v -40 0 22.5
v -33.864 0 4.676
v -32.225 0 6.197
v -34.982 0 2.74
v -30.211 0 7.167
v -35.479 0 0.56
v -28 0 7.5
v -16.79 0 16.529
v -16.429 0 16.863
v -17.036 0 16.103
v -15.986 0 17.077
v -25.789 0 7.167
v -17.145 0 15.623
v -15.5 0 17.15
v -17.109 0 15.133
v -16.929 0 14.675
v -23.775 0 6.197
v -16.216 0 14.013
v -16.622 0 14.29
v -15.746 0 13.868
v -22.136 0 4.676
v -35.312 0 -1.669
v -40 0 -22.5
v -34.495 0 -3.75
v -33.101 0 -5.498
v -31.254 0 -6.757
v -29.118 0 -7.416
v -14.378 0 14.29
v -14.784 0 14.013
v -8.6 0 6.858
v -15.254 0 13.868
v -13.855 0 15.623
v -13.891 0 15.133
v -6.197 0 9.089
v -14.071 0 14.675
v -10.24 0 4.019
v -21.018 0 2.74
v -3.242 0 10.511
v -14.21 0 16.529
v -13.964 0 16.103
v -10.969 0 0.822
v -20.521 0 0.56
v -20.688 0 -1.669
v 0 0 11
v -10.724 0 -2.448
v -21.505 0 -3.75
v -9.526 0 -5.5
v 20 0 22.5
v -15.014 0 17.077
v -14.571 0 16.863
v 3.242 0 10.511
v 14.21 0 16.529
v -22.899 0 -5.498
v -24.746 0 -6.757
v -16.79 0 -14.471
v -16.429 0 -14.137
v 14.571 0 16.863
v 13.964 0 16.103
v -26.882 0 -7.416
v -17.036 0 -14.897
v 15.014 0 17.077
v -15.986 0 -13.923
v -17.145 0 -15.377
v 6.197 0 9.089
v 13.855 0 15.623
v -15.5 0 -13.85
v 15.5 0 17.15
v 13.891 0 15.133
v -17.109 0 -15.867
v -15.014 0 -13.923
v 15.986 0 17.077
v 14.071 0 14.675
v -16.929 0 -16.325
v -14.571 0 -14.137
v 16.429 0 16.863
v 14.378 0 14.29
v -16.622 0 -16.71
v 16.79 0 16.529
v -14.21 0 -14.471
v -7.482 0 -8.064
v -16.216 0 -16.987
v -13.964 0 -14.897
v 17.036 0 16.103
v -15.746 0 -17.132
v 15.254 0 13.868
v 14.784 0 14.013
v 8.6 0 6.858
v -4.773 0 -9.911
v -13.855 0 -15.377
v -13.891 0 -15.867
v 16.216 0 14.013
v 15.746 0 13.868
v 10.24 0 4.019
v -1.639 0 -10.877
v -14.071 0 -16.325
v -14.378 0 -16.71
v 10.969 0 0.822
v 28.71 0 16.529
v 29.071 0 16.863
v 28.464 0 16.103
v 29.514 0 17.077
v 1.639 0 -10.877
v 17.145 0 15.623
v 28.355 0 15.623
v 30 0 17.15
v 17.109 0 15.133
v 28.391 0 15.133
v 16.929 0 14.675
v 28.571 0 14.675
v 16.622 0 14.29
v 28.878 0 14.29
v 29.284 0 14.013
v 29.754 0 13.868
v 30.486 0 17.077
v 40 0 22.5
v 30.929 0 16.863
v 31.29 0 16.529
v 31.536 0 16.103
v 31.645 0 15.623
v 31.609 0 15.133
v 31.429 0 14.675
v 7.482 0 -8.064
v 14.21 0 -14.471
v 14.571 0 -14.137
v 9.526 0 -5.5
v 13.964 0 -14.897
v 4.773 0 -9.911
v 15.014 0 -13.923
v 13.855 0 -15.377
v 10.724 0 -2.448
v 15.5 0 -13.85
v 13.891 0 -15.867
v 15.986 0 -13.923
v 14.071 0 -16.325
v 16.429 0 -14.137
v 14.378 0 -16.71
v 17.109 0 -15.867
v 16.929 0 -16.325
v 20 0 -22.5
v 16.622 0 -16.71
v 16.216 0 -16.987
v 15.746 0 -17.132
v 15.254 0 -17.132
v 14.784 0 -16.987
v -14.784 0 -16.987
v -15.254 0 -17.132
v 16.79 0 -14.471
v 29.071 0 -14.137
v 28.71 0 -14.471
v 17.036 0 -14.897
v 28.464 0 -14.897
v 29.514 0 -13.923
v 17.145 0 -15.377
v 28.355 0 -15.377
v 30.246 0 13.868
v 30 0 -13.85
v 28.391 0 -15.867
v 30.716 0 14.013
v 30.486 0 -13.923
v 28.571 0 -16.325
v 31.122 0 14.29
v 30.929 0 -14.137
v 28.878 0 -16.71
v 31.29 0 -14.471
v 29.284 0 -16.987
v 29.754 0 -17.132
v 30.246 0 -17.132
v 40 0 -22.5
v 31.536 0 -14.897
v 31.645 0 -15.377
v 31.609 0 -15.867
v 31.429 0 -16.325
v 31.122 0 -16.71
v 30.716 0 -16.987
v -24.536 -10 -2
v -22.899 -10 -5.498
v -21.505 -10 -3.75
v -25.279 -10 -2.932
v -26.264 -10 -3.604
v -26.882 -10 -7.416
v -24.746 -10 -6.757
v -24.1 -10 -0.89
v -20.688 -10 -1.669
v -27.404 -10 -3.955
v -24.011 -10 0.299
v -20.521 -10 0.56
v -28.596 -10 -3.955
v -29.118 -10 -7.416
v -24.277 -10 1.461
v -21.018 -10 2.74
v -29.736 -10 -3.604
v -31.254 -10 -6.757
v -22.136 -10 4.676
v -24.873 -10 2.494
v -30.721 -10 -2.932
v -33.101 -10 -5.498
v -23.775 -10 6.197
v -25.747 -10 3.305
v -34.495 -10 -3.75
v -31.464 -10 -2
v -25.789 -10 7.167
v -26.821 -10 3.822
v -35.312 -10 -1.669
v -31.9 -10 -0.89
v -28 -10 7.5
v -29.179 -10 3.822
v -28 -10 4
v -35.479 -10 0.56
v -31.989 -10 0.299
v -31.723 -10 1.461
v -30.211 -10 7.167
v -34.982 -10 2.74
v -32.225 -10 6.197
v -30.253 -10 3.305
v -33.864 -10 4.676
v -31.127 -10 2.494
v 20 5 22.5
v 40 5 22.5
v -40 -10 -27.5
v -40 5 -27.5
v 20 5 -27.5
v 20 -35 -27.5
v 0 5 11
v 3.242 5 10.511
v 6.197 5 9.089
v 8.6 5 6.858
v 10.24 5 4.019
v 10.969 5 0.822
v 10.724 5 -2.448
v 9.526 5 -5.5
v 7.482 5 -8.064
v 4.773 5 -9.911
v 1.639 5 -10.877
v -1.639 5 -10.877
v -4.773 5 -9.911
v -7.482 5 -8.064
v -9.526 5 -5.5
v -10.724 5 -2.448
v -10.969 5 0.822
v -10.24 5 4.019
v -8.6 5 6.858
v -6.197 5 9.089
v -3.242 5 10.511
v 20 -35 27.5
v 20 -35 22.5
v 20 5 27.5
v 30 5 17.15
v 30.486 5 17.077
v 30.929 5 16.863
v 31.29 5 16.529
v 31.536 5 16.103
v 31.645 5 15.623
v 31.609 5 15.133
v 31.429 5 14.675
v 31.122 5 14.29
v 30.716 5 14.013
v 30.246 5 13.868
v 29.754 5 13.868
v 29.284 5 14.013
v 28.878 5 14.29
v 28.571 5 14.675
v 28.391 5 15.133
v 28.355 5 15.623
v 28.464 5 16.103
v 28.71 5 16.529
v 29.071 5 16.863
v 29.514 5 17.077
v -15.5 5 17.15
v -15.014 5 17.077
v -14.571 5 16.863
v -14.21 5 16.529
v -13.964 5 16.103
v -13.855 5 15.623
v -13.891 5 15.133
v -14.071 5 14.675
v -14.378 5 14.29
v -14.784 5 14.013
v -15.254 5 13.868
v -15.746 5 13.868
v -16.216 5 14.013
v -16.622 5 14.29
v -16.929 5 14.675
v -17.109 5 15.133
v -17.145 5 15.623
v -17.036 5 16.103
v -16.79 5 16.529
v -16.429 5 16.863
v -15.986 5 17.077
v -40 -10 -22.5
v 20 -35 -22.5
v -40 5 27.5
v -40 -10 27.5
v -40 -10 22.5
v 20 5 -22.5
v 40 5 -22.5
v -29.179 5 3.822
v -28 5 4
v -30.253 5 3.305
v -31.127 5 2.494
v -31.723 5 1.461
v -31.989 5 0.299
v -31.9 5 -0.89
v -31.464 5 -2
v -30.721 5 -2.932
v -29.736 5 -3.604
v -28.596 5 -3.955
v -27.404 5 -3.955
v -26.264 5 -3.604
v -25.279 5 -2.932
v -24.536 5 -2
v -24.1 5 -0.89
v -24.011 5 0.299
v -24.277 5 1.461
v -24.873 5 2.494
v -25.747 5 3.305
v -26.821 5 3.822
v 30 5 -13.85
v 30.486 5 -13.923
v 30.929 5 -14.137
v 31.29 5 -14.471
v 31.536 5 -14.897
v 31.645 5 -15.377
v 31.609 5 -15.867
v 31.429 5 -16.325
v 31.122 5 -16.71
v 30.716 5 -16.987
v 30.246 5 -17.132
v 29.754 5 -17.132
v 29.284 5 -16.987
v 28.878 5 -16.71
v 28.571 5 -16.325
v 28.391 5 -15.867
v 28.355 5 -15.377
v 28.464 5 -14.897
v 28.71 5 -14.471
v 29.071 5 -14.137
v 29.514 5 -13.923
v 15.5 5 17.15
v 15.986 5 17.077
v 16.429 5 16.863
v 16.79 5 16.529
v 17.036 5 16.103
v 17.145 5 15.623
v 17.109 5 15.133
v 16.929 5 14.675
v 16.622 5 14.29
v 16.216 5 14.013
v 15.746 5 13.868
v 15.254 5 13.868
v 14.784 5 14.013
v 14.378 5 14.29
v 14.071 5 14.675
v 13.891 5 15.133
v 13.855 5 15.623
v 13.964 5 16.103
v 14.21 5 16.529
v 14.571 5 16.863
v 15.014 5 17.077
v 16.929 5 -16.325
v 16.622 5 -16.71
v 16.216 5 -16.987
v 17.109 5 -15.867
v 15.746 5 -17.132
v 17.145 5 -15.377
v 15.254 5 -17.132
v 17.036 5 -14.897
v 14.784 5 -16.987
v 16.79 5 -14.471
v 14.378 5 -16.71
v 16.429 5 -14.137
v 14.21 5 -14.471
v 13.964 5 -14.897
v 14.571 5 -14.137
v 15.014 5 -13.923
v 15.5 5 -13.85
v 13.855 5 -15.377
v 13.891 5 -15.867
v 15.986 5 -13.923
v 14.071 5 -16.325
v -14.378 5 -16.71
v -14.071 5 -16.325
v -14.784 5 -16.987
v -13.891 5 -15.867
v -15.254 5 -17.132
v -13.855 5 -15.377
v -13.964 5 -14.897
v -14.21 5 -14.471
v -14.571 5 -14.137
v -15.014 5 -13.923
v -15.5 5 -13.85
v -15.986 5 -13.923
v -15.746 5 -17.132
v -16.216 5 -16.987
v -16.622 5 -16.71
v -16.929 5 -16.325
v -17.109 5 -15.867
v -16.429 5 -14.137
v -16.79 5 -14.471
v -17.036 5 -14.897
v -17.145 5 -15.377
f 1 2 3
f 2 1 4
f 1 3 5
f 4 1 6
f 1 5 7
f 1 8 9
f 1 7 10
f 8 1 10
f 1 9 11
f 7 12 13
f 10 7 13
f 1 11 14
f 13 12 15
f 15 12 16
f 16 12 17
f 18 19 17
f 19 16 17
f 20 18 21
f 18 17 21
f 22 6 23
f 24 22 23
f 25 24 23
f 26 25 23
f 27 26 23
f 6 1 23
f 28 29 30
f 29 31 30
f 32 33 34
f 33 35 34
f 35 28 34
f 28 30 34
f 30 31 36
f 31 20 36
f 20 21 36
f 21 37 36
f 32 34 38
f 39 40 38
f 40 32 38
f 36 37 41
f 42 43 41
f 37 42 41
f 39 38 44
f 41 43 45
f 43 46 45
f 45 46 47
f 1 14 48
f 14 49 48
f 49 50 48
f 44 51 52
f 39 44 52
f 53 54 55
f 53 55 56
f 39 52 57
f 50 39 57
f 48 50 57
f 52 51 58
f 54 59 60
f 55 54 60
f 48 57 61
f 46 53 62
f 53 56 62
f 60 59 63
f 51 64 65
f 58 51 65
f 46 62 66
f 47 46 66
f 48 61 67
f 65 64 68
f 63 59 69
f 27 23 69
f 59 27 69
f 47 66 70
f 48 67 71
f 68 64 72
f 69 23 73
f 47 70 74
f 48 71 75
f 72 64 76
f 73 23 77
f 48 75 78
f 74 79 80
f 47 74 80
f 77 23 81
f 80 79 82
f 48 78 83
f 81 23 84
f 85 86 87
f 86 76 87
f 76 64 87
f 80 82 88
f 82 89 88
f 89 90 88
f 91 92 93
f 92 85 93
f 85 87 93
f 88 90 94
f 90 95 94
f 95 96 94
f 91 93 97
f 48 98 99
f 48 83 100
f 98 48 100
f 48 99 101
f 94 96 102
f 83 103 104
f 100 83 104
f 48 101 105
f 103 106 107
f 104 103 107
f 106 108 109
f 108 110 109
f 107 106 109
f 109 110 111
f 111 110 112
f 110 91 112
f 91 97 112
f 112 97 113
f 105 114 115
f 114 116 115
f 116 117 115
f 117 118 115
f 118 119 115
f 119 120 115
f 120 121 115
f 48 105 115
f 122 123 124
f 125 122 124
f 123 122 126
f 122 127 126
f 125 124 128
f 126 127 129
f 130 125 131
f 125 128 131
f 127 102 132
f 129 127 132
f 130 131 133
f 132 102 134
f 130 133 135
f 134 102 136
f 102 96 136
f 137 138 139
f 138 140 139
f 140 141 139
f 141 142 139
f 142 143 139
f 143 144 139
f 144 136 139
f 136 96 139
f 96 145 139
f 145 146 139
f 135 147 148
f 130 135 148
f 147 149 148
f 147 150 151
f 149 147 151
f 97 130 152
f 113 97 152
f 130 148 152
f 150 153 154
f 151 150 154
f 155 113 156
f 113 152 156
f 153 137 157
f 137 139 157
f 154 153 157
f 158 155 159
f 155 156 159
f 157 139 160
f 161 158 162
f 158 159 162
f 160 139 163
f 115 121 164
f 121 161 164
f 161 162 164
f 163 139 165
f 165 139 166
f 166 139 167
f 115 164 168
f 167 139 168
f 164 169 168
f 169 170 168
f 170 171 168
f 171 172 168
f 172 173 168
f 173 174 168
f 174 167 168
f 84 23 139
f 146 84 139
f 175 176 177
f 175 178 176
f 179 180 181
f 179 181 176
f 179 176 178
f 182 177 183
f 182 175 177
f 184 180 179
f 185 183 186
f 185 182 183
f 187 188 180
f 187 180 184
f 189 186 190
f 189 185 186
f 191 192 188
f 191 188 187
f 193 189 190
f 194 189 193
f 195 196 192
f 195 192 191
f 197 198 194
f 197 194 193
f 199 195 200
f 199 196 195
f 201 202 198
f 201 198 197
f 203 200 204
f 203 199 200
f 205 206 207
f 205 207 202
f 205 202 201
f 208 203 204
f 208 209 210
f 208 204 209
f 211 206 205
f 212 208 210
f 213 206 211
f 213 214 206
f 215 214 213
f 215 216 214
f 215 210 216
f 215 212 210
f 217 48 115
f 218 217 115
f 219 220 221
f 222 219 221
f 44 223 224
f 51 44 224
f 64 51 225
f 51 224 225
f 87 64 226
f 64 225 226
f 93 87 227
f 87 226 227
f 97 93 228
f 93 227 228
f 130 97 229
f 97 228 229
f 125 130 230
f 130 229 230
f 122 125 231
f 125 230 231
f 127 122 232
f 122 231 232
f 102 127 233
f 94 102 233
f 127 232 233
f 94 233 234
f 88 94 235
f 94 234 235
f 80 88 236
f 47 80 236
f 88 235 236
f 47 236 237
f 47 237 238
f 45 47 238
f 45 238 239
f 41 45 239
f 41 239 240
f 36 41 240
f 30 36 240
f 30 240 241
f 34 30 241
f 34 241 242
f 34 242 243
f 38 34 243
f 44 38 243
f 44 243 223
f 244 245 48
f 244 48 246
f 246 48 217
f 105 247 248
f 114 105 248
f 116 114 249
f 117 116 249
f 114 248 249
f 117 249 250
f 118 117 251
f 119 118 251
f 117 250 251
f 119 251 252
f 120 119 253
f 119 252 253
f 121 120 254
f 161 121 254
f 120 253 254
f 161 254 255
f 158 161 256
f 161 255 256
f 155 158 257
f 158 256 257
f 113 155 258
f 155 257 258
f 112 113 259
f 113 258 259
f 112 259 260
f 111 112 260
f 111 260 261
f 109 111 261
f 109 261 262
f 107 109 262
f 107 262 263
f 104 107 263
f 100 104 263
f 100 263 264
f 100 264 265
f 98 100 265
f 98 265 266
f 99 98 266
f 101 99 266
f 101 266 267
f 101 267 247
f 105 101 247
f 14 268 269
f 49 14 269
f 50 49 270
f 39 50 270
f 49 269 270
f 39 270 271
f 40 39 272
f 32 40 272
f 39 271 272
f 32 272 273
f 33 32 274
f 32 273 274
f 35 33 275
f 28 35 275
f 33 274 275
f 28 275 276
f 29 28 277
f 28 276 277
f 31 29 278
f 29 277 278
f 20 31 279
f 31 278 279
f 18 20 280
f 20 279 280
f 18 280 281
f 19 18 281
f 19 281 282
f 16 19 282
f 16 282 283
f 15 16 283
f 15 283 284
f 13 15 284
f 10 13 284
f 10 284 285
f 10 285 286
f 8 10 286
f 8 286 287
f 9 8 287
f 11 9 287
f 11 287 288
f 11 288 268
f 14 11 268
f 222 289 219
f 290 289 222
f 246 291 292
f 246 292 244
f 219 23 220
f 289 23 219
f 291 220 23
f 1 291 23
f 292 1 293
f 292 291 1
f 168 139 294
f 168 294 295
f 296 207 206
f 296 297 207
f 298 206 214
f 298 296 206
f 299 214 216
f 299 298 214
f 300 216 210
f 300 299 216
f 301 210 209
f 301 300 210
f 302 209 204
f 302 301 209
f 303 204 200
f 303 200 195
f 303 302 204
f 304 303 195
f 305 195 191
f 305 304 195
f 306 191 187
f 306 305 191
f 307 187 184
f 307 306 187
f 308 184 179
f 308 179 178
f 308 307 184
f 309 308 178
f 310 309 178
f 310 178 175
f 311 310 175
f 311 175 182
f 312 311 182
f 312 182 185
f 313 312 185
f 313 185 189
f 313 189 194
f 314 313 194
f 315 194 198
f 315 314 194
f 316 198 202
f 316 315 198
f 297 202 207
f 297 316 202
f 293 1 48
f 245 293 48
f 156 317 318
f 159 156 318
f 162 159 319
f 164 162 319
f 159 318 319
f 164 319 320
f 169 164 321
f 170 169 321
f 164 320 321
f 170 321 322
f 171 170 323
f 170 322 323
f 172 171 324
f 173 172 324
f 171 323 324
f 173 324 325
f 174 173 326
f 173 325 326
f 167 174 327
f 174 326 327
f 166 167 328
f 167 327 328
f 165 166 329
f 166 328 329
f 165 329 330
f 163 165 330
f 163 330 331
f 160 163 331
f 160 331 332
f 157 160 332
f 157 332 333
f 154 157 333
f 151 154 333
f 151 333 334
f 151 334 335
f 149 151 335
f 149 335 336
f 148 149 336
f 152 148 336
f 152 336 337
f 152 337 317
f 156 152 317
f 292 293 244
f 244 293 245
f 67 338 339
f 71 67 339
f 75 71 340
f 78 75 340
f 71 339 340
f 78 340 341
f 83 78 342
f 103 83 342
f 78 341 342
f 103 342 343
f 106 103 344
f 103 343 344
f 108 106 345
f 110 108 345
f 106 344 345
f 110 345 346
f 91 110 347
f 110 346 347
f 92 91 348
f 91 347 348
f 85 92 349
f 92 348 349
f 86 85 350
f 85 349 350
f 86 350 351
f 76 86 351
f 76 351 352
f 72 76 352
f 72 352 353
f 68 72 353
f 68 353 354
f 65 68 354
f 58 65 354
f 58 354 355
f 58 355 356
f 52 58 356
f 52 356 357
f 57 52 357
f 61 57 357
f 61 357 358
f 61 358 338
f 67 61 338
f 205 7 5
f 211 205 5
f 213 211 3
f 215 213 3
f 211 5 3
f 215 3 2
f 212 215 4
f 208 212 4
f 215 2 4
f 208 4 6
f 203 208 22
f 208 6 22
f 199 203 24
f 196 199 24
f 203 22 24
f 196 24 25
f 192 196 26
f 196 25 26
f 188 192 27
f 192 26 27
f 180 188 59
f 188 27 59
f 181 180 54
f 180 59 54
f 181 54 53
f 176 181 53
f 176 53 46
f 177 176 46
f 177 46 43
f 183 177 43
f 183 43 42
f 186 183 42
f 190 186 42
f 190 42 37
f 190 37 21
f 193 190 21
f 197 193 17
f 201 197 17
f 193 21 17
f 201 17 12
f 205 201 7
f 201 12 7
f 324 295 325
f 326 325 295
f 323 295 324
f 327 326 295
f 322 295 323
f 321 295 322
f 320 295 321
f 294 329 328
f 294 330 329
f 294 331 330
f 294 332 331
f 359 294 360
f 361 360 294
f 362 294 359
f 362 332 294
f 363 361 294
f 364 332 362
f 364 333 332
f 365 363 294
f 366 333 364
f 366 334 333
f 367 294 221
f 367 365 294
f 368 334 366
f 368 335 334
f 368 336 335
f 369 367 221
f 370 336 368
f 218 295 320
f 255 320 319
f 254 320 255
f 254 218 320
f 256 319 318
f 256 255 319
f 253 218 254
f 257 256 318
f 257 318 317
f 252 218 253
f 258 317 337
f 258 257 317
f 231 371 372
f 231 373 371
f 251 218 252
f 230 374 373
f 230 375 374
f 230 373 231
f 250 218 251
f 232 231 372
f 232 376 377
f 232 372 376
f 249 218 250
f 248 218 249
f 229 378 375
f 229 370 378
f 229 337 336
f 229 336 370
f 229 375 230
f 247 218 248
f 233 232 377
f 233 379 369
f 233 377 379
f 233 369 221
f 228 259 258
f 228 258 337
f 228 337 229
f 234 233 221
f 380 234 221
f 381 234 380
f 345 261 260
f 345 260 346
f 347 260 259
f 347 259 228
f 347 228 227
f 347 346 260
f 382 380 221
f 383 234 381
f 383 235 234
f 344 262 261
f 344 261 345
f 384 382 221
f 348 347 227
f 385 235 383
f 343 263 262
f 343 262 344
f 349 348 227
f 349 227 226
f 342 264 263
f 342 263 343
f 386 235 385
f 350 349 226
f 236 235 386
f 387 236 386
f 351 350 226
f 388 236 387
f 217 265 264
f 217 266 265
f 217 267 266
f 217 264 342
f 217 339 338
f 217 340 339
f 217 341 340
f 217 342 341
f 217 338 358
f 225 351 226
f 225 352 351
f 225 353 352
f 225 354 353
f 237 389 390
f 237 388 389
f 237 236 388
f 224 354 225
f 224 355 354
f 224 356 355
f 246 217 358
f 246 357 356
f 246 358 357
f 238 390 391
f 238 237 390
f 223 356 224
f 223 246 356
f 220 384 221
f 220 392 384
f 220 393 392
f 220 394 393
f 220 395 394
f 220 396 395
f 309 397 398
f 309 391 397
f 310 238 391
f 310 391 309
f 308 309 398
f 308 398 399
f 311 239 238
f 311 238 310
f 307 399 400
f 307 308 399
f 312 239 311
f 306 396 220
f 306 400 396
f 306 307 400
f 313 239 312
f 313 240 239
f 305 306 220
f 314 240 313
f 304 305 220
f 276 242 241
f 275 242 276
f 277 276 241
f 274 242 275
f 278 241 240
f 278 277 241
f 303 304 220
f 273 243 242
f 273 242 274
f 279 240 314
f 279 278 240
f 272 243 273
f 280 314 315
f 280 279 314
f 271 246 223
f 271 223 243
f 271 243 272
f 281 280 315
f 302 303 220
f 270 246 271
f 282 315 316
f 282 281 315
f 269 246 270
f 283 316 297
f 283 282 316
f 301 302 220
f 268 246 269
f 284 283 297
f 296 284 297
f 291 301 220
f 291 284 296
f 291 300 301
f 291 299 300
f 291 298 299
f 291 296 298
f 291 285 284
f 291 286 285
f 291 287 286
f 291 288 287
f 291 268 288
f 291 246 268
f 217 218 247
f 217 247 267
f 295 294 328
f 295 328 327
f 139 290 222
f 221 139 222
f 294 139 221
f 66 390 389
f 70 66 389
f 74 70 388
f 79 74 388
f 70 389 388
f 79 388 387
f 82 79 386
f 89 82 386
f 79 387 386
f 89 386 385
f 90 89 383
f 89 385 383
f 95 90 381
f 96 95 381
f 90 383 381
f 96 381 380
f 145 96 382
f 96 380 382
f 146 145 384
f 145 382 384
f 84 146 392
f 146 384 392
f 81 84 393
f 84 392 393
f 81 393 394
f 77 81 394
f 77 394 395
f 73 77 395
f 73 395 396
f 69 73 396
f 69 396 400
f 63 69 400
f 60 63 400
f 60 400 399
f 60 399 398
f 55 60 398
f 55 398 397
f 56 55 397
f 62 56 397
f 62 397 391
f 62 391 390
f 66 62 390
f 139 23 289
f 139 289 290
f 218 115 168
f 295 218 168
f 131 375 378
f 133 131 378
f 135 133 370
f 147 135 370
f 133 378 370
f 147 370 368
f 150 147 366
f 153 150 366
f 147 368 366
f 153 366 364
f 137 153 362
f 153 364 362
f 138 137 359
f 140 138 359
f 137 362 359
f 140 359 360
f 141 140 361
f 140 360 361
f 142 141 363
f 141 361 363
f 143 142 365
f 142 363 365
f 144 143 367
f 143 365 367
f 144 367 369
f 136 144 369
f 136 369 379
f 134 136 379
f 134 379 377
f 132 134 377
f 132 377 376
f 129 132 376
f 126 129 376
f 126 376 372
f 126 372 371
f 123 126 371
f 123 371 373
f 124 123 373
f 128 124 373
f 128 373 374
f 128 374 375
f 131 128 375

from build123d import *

# Parameters (mm, degrees)
SKETCH_1_W          = 80
SKETCH_1_H          = 45
EXTRUDE_1_DEPTH     = 5
SKETCH_2_R          = 1.65
SKETCH_2_R_2        = 4
SKETCH_2_R_3        = 11
CUT_EXTRUDE_1_DEPTH = 47.165463282
SKETCH_3_R          = 7.5
SKETCH_3_R_2        = 4
EXTRUDE_2_DEPTH     = 10
EXTRUDE_4_DEPTH     = 5


with BuildPart() as part:
    # 草图1 → 凸台-拉伸1 (new body)
    with BuildSketch(Plane(origin=(0, 0, 0), x_dir=(1, 0, 0), z_dir=(0, 1, 0))):
        Rectangle(SKETCH_1_W, SKETCH_1_H)
    extrude(amount=EXTRUDE_1_DEPTH)

    # 草图2 → 切除-拉伸1 (cut, through all)
    with BuildSketch(Plane(origin=(0, 5, 0), x_dir=(1, 0, 0), z_dir=(0, 1, 0))):
        with Locations(Location((-15.5, 15.5, 0), (0, 0, 270))):
            Circle(SKETCH_2_R)
        with Locations(Location((15.5, 15.5, 0), (0, 0, 270))):
            Circle(SKETCH_2_R)
        with Locations(Location((15.5, -15.5, 0), (0, 0, 270))):
            Circle(SKETCH_2_R)
        with Locations(Location((-15.5, -15.5, 0), (0, 0, 270))):
            Circle(SKETCH_2_R)
        with Locations(Location((30, 15.5, 0), (0, 0, 270))):
            Circle(SKETCH_2_R)
        with Locations(Location((30, -15.5, 0), (0, 0, 270))):
            Circle(SKETCH_2_R)
        with Locations(Location((-28, 0, 0), (0, 0, 270))):
            Circle(SKETCH_2_R_2)
        with Locations(Location((0, 0, 0), (0, 0, 270))):
            Circle(SKETCH_2_R_3)
    extrude(amount=-CUT_EXTRUDE_1_DEPTH, mode=Mode.SUBTRACT)

    # 草图3 → 凸台-拉伸2 (add)
    with BuildSketch(Plane.XZ):
        with Locations(Location((-28, 0, 0), (0, 0, 90))):
            Circle(SKETCH_3_R)
        with Locations(Location((-28, 0, 0), (0, 0, 90))):
            Circle(SKETCH_3_R_2, mode=Mode.SUBTRACT)
    extrude(amount=EXTRUDE_2_DEPTH)

    # 草图6 → 凸台-拉伸4 (add)
    with BuildSketch(Plane.XY.offset(22.5)):
        Polygon((-40, 5), (-40, -10), (20, -35), (20, 5), align=None)
    extrude_4 = extrude(amount=EXTRUDE_4_DEPTH)

    # 镜向1: 凸台-拉伸4 across plane
    add(extrude_4.mirror(Plane(origin=(0, 0, 0), x_dir=(1, 0, 0), z_dir=(0, 0, -1))))


solid = part.part
